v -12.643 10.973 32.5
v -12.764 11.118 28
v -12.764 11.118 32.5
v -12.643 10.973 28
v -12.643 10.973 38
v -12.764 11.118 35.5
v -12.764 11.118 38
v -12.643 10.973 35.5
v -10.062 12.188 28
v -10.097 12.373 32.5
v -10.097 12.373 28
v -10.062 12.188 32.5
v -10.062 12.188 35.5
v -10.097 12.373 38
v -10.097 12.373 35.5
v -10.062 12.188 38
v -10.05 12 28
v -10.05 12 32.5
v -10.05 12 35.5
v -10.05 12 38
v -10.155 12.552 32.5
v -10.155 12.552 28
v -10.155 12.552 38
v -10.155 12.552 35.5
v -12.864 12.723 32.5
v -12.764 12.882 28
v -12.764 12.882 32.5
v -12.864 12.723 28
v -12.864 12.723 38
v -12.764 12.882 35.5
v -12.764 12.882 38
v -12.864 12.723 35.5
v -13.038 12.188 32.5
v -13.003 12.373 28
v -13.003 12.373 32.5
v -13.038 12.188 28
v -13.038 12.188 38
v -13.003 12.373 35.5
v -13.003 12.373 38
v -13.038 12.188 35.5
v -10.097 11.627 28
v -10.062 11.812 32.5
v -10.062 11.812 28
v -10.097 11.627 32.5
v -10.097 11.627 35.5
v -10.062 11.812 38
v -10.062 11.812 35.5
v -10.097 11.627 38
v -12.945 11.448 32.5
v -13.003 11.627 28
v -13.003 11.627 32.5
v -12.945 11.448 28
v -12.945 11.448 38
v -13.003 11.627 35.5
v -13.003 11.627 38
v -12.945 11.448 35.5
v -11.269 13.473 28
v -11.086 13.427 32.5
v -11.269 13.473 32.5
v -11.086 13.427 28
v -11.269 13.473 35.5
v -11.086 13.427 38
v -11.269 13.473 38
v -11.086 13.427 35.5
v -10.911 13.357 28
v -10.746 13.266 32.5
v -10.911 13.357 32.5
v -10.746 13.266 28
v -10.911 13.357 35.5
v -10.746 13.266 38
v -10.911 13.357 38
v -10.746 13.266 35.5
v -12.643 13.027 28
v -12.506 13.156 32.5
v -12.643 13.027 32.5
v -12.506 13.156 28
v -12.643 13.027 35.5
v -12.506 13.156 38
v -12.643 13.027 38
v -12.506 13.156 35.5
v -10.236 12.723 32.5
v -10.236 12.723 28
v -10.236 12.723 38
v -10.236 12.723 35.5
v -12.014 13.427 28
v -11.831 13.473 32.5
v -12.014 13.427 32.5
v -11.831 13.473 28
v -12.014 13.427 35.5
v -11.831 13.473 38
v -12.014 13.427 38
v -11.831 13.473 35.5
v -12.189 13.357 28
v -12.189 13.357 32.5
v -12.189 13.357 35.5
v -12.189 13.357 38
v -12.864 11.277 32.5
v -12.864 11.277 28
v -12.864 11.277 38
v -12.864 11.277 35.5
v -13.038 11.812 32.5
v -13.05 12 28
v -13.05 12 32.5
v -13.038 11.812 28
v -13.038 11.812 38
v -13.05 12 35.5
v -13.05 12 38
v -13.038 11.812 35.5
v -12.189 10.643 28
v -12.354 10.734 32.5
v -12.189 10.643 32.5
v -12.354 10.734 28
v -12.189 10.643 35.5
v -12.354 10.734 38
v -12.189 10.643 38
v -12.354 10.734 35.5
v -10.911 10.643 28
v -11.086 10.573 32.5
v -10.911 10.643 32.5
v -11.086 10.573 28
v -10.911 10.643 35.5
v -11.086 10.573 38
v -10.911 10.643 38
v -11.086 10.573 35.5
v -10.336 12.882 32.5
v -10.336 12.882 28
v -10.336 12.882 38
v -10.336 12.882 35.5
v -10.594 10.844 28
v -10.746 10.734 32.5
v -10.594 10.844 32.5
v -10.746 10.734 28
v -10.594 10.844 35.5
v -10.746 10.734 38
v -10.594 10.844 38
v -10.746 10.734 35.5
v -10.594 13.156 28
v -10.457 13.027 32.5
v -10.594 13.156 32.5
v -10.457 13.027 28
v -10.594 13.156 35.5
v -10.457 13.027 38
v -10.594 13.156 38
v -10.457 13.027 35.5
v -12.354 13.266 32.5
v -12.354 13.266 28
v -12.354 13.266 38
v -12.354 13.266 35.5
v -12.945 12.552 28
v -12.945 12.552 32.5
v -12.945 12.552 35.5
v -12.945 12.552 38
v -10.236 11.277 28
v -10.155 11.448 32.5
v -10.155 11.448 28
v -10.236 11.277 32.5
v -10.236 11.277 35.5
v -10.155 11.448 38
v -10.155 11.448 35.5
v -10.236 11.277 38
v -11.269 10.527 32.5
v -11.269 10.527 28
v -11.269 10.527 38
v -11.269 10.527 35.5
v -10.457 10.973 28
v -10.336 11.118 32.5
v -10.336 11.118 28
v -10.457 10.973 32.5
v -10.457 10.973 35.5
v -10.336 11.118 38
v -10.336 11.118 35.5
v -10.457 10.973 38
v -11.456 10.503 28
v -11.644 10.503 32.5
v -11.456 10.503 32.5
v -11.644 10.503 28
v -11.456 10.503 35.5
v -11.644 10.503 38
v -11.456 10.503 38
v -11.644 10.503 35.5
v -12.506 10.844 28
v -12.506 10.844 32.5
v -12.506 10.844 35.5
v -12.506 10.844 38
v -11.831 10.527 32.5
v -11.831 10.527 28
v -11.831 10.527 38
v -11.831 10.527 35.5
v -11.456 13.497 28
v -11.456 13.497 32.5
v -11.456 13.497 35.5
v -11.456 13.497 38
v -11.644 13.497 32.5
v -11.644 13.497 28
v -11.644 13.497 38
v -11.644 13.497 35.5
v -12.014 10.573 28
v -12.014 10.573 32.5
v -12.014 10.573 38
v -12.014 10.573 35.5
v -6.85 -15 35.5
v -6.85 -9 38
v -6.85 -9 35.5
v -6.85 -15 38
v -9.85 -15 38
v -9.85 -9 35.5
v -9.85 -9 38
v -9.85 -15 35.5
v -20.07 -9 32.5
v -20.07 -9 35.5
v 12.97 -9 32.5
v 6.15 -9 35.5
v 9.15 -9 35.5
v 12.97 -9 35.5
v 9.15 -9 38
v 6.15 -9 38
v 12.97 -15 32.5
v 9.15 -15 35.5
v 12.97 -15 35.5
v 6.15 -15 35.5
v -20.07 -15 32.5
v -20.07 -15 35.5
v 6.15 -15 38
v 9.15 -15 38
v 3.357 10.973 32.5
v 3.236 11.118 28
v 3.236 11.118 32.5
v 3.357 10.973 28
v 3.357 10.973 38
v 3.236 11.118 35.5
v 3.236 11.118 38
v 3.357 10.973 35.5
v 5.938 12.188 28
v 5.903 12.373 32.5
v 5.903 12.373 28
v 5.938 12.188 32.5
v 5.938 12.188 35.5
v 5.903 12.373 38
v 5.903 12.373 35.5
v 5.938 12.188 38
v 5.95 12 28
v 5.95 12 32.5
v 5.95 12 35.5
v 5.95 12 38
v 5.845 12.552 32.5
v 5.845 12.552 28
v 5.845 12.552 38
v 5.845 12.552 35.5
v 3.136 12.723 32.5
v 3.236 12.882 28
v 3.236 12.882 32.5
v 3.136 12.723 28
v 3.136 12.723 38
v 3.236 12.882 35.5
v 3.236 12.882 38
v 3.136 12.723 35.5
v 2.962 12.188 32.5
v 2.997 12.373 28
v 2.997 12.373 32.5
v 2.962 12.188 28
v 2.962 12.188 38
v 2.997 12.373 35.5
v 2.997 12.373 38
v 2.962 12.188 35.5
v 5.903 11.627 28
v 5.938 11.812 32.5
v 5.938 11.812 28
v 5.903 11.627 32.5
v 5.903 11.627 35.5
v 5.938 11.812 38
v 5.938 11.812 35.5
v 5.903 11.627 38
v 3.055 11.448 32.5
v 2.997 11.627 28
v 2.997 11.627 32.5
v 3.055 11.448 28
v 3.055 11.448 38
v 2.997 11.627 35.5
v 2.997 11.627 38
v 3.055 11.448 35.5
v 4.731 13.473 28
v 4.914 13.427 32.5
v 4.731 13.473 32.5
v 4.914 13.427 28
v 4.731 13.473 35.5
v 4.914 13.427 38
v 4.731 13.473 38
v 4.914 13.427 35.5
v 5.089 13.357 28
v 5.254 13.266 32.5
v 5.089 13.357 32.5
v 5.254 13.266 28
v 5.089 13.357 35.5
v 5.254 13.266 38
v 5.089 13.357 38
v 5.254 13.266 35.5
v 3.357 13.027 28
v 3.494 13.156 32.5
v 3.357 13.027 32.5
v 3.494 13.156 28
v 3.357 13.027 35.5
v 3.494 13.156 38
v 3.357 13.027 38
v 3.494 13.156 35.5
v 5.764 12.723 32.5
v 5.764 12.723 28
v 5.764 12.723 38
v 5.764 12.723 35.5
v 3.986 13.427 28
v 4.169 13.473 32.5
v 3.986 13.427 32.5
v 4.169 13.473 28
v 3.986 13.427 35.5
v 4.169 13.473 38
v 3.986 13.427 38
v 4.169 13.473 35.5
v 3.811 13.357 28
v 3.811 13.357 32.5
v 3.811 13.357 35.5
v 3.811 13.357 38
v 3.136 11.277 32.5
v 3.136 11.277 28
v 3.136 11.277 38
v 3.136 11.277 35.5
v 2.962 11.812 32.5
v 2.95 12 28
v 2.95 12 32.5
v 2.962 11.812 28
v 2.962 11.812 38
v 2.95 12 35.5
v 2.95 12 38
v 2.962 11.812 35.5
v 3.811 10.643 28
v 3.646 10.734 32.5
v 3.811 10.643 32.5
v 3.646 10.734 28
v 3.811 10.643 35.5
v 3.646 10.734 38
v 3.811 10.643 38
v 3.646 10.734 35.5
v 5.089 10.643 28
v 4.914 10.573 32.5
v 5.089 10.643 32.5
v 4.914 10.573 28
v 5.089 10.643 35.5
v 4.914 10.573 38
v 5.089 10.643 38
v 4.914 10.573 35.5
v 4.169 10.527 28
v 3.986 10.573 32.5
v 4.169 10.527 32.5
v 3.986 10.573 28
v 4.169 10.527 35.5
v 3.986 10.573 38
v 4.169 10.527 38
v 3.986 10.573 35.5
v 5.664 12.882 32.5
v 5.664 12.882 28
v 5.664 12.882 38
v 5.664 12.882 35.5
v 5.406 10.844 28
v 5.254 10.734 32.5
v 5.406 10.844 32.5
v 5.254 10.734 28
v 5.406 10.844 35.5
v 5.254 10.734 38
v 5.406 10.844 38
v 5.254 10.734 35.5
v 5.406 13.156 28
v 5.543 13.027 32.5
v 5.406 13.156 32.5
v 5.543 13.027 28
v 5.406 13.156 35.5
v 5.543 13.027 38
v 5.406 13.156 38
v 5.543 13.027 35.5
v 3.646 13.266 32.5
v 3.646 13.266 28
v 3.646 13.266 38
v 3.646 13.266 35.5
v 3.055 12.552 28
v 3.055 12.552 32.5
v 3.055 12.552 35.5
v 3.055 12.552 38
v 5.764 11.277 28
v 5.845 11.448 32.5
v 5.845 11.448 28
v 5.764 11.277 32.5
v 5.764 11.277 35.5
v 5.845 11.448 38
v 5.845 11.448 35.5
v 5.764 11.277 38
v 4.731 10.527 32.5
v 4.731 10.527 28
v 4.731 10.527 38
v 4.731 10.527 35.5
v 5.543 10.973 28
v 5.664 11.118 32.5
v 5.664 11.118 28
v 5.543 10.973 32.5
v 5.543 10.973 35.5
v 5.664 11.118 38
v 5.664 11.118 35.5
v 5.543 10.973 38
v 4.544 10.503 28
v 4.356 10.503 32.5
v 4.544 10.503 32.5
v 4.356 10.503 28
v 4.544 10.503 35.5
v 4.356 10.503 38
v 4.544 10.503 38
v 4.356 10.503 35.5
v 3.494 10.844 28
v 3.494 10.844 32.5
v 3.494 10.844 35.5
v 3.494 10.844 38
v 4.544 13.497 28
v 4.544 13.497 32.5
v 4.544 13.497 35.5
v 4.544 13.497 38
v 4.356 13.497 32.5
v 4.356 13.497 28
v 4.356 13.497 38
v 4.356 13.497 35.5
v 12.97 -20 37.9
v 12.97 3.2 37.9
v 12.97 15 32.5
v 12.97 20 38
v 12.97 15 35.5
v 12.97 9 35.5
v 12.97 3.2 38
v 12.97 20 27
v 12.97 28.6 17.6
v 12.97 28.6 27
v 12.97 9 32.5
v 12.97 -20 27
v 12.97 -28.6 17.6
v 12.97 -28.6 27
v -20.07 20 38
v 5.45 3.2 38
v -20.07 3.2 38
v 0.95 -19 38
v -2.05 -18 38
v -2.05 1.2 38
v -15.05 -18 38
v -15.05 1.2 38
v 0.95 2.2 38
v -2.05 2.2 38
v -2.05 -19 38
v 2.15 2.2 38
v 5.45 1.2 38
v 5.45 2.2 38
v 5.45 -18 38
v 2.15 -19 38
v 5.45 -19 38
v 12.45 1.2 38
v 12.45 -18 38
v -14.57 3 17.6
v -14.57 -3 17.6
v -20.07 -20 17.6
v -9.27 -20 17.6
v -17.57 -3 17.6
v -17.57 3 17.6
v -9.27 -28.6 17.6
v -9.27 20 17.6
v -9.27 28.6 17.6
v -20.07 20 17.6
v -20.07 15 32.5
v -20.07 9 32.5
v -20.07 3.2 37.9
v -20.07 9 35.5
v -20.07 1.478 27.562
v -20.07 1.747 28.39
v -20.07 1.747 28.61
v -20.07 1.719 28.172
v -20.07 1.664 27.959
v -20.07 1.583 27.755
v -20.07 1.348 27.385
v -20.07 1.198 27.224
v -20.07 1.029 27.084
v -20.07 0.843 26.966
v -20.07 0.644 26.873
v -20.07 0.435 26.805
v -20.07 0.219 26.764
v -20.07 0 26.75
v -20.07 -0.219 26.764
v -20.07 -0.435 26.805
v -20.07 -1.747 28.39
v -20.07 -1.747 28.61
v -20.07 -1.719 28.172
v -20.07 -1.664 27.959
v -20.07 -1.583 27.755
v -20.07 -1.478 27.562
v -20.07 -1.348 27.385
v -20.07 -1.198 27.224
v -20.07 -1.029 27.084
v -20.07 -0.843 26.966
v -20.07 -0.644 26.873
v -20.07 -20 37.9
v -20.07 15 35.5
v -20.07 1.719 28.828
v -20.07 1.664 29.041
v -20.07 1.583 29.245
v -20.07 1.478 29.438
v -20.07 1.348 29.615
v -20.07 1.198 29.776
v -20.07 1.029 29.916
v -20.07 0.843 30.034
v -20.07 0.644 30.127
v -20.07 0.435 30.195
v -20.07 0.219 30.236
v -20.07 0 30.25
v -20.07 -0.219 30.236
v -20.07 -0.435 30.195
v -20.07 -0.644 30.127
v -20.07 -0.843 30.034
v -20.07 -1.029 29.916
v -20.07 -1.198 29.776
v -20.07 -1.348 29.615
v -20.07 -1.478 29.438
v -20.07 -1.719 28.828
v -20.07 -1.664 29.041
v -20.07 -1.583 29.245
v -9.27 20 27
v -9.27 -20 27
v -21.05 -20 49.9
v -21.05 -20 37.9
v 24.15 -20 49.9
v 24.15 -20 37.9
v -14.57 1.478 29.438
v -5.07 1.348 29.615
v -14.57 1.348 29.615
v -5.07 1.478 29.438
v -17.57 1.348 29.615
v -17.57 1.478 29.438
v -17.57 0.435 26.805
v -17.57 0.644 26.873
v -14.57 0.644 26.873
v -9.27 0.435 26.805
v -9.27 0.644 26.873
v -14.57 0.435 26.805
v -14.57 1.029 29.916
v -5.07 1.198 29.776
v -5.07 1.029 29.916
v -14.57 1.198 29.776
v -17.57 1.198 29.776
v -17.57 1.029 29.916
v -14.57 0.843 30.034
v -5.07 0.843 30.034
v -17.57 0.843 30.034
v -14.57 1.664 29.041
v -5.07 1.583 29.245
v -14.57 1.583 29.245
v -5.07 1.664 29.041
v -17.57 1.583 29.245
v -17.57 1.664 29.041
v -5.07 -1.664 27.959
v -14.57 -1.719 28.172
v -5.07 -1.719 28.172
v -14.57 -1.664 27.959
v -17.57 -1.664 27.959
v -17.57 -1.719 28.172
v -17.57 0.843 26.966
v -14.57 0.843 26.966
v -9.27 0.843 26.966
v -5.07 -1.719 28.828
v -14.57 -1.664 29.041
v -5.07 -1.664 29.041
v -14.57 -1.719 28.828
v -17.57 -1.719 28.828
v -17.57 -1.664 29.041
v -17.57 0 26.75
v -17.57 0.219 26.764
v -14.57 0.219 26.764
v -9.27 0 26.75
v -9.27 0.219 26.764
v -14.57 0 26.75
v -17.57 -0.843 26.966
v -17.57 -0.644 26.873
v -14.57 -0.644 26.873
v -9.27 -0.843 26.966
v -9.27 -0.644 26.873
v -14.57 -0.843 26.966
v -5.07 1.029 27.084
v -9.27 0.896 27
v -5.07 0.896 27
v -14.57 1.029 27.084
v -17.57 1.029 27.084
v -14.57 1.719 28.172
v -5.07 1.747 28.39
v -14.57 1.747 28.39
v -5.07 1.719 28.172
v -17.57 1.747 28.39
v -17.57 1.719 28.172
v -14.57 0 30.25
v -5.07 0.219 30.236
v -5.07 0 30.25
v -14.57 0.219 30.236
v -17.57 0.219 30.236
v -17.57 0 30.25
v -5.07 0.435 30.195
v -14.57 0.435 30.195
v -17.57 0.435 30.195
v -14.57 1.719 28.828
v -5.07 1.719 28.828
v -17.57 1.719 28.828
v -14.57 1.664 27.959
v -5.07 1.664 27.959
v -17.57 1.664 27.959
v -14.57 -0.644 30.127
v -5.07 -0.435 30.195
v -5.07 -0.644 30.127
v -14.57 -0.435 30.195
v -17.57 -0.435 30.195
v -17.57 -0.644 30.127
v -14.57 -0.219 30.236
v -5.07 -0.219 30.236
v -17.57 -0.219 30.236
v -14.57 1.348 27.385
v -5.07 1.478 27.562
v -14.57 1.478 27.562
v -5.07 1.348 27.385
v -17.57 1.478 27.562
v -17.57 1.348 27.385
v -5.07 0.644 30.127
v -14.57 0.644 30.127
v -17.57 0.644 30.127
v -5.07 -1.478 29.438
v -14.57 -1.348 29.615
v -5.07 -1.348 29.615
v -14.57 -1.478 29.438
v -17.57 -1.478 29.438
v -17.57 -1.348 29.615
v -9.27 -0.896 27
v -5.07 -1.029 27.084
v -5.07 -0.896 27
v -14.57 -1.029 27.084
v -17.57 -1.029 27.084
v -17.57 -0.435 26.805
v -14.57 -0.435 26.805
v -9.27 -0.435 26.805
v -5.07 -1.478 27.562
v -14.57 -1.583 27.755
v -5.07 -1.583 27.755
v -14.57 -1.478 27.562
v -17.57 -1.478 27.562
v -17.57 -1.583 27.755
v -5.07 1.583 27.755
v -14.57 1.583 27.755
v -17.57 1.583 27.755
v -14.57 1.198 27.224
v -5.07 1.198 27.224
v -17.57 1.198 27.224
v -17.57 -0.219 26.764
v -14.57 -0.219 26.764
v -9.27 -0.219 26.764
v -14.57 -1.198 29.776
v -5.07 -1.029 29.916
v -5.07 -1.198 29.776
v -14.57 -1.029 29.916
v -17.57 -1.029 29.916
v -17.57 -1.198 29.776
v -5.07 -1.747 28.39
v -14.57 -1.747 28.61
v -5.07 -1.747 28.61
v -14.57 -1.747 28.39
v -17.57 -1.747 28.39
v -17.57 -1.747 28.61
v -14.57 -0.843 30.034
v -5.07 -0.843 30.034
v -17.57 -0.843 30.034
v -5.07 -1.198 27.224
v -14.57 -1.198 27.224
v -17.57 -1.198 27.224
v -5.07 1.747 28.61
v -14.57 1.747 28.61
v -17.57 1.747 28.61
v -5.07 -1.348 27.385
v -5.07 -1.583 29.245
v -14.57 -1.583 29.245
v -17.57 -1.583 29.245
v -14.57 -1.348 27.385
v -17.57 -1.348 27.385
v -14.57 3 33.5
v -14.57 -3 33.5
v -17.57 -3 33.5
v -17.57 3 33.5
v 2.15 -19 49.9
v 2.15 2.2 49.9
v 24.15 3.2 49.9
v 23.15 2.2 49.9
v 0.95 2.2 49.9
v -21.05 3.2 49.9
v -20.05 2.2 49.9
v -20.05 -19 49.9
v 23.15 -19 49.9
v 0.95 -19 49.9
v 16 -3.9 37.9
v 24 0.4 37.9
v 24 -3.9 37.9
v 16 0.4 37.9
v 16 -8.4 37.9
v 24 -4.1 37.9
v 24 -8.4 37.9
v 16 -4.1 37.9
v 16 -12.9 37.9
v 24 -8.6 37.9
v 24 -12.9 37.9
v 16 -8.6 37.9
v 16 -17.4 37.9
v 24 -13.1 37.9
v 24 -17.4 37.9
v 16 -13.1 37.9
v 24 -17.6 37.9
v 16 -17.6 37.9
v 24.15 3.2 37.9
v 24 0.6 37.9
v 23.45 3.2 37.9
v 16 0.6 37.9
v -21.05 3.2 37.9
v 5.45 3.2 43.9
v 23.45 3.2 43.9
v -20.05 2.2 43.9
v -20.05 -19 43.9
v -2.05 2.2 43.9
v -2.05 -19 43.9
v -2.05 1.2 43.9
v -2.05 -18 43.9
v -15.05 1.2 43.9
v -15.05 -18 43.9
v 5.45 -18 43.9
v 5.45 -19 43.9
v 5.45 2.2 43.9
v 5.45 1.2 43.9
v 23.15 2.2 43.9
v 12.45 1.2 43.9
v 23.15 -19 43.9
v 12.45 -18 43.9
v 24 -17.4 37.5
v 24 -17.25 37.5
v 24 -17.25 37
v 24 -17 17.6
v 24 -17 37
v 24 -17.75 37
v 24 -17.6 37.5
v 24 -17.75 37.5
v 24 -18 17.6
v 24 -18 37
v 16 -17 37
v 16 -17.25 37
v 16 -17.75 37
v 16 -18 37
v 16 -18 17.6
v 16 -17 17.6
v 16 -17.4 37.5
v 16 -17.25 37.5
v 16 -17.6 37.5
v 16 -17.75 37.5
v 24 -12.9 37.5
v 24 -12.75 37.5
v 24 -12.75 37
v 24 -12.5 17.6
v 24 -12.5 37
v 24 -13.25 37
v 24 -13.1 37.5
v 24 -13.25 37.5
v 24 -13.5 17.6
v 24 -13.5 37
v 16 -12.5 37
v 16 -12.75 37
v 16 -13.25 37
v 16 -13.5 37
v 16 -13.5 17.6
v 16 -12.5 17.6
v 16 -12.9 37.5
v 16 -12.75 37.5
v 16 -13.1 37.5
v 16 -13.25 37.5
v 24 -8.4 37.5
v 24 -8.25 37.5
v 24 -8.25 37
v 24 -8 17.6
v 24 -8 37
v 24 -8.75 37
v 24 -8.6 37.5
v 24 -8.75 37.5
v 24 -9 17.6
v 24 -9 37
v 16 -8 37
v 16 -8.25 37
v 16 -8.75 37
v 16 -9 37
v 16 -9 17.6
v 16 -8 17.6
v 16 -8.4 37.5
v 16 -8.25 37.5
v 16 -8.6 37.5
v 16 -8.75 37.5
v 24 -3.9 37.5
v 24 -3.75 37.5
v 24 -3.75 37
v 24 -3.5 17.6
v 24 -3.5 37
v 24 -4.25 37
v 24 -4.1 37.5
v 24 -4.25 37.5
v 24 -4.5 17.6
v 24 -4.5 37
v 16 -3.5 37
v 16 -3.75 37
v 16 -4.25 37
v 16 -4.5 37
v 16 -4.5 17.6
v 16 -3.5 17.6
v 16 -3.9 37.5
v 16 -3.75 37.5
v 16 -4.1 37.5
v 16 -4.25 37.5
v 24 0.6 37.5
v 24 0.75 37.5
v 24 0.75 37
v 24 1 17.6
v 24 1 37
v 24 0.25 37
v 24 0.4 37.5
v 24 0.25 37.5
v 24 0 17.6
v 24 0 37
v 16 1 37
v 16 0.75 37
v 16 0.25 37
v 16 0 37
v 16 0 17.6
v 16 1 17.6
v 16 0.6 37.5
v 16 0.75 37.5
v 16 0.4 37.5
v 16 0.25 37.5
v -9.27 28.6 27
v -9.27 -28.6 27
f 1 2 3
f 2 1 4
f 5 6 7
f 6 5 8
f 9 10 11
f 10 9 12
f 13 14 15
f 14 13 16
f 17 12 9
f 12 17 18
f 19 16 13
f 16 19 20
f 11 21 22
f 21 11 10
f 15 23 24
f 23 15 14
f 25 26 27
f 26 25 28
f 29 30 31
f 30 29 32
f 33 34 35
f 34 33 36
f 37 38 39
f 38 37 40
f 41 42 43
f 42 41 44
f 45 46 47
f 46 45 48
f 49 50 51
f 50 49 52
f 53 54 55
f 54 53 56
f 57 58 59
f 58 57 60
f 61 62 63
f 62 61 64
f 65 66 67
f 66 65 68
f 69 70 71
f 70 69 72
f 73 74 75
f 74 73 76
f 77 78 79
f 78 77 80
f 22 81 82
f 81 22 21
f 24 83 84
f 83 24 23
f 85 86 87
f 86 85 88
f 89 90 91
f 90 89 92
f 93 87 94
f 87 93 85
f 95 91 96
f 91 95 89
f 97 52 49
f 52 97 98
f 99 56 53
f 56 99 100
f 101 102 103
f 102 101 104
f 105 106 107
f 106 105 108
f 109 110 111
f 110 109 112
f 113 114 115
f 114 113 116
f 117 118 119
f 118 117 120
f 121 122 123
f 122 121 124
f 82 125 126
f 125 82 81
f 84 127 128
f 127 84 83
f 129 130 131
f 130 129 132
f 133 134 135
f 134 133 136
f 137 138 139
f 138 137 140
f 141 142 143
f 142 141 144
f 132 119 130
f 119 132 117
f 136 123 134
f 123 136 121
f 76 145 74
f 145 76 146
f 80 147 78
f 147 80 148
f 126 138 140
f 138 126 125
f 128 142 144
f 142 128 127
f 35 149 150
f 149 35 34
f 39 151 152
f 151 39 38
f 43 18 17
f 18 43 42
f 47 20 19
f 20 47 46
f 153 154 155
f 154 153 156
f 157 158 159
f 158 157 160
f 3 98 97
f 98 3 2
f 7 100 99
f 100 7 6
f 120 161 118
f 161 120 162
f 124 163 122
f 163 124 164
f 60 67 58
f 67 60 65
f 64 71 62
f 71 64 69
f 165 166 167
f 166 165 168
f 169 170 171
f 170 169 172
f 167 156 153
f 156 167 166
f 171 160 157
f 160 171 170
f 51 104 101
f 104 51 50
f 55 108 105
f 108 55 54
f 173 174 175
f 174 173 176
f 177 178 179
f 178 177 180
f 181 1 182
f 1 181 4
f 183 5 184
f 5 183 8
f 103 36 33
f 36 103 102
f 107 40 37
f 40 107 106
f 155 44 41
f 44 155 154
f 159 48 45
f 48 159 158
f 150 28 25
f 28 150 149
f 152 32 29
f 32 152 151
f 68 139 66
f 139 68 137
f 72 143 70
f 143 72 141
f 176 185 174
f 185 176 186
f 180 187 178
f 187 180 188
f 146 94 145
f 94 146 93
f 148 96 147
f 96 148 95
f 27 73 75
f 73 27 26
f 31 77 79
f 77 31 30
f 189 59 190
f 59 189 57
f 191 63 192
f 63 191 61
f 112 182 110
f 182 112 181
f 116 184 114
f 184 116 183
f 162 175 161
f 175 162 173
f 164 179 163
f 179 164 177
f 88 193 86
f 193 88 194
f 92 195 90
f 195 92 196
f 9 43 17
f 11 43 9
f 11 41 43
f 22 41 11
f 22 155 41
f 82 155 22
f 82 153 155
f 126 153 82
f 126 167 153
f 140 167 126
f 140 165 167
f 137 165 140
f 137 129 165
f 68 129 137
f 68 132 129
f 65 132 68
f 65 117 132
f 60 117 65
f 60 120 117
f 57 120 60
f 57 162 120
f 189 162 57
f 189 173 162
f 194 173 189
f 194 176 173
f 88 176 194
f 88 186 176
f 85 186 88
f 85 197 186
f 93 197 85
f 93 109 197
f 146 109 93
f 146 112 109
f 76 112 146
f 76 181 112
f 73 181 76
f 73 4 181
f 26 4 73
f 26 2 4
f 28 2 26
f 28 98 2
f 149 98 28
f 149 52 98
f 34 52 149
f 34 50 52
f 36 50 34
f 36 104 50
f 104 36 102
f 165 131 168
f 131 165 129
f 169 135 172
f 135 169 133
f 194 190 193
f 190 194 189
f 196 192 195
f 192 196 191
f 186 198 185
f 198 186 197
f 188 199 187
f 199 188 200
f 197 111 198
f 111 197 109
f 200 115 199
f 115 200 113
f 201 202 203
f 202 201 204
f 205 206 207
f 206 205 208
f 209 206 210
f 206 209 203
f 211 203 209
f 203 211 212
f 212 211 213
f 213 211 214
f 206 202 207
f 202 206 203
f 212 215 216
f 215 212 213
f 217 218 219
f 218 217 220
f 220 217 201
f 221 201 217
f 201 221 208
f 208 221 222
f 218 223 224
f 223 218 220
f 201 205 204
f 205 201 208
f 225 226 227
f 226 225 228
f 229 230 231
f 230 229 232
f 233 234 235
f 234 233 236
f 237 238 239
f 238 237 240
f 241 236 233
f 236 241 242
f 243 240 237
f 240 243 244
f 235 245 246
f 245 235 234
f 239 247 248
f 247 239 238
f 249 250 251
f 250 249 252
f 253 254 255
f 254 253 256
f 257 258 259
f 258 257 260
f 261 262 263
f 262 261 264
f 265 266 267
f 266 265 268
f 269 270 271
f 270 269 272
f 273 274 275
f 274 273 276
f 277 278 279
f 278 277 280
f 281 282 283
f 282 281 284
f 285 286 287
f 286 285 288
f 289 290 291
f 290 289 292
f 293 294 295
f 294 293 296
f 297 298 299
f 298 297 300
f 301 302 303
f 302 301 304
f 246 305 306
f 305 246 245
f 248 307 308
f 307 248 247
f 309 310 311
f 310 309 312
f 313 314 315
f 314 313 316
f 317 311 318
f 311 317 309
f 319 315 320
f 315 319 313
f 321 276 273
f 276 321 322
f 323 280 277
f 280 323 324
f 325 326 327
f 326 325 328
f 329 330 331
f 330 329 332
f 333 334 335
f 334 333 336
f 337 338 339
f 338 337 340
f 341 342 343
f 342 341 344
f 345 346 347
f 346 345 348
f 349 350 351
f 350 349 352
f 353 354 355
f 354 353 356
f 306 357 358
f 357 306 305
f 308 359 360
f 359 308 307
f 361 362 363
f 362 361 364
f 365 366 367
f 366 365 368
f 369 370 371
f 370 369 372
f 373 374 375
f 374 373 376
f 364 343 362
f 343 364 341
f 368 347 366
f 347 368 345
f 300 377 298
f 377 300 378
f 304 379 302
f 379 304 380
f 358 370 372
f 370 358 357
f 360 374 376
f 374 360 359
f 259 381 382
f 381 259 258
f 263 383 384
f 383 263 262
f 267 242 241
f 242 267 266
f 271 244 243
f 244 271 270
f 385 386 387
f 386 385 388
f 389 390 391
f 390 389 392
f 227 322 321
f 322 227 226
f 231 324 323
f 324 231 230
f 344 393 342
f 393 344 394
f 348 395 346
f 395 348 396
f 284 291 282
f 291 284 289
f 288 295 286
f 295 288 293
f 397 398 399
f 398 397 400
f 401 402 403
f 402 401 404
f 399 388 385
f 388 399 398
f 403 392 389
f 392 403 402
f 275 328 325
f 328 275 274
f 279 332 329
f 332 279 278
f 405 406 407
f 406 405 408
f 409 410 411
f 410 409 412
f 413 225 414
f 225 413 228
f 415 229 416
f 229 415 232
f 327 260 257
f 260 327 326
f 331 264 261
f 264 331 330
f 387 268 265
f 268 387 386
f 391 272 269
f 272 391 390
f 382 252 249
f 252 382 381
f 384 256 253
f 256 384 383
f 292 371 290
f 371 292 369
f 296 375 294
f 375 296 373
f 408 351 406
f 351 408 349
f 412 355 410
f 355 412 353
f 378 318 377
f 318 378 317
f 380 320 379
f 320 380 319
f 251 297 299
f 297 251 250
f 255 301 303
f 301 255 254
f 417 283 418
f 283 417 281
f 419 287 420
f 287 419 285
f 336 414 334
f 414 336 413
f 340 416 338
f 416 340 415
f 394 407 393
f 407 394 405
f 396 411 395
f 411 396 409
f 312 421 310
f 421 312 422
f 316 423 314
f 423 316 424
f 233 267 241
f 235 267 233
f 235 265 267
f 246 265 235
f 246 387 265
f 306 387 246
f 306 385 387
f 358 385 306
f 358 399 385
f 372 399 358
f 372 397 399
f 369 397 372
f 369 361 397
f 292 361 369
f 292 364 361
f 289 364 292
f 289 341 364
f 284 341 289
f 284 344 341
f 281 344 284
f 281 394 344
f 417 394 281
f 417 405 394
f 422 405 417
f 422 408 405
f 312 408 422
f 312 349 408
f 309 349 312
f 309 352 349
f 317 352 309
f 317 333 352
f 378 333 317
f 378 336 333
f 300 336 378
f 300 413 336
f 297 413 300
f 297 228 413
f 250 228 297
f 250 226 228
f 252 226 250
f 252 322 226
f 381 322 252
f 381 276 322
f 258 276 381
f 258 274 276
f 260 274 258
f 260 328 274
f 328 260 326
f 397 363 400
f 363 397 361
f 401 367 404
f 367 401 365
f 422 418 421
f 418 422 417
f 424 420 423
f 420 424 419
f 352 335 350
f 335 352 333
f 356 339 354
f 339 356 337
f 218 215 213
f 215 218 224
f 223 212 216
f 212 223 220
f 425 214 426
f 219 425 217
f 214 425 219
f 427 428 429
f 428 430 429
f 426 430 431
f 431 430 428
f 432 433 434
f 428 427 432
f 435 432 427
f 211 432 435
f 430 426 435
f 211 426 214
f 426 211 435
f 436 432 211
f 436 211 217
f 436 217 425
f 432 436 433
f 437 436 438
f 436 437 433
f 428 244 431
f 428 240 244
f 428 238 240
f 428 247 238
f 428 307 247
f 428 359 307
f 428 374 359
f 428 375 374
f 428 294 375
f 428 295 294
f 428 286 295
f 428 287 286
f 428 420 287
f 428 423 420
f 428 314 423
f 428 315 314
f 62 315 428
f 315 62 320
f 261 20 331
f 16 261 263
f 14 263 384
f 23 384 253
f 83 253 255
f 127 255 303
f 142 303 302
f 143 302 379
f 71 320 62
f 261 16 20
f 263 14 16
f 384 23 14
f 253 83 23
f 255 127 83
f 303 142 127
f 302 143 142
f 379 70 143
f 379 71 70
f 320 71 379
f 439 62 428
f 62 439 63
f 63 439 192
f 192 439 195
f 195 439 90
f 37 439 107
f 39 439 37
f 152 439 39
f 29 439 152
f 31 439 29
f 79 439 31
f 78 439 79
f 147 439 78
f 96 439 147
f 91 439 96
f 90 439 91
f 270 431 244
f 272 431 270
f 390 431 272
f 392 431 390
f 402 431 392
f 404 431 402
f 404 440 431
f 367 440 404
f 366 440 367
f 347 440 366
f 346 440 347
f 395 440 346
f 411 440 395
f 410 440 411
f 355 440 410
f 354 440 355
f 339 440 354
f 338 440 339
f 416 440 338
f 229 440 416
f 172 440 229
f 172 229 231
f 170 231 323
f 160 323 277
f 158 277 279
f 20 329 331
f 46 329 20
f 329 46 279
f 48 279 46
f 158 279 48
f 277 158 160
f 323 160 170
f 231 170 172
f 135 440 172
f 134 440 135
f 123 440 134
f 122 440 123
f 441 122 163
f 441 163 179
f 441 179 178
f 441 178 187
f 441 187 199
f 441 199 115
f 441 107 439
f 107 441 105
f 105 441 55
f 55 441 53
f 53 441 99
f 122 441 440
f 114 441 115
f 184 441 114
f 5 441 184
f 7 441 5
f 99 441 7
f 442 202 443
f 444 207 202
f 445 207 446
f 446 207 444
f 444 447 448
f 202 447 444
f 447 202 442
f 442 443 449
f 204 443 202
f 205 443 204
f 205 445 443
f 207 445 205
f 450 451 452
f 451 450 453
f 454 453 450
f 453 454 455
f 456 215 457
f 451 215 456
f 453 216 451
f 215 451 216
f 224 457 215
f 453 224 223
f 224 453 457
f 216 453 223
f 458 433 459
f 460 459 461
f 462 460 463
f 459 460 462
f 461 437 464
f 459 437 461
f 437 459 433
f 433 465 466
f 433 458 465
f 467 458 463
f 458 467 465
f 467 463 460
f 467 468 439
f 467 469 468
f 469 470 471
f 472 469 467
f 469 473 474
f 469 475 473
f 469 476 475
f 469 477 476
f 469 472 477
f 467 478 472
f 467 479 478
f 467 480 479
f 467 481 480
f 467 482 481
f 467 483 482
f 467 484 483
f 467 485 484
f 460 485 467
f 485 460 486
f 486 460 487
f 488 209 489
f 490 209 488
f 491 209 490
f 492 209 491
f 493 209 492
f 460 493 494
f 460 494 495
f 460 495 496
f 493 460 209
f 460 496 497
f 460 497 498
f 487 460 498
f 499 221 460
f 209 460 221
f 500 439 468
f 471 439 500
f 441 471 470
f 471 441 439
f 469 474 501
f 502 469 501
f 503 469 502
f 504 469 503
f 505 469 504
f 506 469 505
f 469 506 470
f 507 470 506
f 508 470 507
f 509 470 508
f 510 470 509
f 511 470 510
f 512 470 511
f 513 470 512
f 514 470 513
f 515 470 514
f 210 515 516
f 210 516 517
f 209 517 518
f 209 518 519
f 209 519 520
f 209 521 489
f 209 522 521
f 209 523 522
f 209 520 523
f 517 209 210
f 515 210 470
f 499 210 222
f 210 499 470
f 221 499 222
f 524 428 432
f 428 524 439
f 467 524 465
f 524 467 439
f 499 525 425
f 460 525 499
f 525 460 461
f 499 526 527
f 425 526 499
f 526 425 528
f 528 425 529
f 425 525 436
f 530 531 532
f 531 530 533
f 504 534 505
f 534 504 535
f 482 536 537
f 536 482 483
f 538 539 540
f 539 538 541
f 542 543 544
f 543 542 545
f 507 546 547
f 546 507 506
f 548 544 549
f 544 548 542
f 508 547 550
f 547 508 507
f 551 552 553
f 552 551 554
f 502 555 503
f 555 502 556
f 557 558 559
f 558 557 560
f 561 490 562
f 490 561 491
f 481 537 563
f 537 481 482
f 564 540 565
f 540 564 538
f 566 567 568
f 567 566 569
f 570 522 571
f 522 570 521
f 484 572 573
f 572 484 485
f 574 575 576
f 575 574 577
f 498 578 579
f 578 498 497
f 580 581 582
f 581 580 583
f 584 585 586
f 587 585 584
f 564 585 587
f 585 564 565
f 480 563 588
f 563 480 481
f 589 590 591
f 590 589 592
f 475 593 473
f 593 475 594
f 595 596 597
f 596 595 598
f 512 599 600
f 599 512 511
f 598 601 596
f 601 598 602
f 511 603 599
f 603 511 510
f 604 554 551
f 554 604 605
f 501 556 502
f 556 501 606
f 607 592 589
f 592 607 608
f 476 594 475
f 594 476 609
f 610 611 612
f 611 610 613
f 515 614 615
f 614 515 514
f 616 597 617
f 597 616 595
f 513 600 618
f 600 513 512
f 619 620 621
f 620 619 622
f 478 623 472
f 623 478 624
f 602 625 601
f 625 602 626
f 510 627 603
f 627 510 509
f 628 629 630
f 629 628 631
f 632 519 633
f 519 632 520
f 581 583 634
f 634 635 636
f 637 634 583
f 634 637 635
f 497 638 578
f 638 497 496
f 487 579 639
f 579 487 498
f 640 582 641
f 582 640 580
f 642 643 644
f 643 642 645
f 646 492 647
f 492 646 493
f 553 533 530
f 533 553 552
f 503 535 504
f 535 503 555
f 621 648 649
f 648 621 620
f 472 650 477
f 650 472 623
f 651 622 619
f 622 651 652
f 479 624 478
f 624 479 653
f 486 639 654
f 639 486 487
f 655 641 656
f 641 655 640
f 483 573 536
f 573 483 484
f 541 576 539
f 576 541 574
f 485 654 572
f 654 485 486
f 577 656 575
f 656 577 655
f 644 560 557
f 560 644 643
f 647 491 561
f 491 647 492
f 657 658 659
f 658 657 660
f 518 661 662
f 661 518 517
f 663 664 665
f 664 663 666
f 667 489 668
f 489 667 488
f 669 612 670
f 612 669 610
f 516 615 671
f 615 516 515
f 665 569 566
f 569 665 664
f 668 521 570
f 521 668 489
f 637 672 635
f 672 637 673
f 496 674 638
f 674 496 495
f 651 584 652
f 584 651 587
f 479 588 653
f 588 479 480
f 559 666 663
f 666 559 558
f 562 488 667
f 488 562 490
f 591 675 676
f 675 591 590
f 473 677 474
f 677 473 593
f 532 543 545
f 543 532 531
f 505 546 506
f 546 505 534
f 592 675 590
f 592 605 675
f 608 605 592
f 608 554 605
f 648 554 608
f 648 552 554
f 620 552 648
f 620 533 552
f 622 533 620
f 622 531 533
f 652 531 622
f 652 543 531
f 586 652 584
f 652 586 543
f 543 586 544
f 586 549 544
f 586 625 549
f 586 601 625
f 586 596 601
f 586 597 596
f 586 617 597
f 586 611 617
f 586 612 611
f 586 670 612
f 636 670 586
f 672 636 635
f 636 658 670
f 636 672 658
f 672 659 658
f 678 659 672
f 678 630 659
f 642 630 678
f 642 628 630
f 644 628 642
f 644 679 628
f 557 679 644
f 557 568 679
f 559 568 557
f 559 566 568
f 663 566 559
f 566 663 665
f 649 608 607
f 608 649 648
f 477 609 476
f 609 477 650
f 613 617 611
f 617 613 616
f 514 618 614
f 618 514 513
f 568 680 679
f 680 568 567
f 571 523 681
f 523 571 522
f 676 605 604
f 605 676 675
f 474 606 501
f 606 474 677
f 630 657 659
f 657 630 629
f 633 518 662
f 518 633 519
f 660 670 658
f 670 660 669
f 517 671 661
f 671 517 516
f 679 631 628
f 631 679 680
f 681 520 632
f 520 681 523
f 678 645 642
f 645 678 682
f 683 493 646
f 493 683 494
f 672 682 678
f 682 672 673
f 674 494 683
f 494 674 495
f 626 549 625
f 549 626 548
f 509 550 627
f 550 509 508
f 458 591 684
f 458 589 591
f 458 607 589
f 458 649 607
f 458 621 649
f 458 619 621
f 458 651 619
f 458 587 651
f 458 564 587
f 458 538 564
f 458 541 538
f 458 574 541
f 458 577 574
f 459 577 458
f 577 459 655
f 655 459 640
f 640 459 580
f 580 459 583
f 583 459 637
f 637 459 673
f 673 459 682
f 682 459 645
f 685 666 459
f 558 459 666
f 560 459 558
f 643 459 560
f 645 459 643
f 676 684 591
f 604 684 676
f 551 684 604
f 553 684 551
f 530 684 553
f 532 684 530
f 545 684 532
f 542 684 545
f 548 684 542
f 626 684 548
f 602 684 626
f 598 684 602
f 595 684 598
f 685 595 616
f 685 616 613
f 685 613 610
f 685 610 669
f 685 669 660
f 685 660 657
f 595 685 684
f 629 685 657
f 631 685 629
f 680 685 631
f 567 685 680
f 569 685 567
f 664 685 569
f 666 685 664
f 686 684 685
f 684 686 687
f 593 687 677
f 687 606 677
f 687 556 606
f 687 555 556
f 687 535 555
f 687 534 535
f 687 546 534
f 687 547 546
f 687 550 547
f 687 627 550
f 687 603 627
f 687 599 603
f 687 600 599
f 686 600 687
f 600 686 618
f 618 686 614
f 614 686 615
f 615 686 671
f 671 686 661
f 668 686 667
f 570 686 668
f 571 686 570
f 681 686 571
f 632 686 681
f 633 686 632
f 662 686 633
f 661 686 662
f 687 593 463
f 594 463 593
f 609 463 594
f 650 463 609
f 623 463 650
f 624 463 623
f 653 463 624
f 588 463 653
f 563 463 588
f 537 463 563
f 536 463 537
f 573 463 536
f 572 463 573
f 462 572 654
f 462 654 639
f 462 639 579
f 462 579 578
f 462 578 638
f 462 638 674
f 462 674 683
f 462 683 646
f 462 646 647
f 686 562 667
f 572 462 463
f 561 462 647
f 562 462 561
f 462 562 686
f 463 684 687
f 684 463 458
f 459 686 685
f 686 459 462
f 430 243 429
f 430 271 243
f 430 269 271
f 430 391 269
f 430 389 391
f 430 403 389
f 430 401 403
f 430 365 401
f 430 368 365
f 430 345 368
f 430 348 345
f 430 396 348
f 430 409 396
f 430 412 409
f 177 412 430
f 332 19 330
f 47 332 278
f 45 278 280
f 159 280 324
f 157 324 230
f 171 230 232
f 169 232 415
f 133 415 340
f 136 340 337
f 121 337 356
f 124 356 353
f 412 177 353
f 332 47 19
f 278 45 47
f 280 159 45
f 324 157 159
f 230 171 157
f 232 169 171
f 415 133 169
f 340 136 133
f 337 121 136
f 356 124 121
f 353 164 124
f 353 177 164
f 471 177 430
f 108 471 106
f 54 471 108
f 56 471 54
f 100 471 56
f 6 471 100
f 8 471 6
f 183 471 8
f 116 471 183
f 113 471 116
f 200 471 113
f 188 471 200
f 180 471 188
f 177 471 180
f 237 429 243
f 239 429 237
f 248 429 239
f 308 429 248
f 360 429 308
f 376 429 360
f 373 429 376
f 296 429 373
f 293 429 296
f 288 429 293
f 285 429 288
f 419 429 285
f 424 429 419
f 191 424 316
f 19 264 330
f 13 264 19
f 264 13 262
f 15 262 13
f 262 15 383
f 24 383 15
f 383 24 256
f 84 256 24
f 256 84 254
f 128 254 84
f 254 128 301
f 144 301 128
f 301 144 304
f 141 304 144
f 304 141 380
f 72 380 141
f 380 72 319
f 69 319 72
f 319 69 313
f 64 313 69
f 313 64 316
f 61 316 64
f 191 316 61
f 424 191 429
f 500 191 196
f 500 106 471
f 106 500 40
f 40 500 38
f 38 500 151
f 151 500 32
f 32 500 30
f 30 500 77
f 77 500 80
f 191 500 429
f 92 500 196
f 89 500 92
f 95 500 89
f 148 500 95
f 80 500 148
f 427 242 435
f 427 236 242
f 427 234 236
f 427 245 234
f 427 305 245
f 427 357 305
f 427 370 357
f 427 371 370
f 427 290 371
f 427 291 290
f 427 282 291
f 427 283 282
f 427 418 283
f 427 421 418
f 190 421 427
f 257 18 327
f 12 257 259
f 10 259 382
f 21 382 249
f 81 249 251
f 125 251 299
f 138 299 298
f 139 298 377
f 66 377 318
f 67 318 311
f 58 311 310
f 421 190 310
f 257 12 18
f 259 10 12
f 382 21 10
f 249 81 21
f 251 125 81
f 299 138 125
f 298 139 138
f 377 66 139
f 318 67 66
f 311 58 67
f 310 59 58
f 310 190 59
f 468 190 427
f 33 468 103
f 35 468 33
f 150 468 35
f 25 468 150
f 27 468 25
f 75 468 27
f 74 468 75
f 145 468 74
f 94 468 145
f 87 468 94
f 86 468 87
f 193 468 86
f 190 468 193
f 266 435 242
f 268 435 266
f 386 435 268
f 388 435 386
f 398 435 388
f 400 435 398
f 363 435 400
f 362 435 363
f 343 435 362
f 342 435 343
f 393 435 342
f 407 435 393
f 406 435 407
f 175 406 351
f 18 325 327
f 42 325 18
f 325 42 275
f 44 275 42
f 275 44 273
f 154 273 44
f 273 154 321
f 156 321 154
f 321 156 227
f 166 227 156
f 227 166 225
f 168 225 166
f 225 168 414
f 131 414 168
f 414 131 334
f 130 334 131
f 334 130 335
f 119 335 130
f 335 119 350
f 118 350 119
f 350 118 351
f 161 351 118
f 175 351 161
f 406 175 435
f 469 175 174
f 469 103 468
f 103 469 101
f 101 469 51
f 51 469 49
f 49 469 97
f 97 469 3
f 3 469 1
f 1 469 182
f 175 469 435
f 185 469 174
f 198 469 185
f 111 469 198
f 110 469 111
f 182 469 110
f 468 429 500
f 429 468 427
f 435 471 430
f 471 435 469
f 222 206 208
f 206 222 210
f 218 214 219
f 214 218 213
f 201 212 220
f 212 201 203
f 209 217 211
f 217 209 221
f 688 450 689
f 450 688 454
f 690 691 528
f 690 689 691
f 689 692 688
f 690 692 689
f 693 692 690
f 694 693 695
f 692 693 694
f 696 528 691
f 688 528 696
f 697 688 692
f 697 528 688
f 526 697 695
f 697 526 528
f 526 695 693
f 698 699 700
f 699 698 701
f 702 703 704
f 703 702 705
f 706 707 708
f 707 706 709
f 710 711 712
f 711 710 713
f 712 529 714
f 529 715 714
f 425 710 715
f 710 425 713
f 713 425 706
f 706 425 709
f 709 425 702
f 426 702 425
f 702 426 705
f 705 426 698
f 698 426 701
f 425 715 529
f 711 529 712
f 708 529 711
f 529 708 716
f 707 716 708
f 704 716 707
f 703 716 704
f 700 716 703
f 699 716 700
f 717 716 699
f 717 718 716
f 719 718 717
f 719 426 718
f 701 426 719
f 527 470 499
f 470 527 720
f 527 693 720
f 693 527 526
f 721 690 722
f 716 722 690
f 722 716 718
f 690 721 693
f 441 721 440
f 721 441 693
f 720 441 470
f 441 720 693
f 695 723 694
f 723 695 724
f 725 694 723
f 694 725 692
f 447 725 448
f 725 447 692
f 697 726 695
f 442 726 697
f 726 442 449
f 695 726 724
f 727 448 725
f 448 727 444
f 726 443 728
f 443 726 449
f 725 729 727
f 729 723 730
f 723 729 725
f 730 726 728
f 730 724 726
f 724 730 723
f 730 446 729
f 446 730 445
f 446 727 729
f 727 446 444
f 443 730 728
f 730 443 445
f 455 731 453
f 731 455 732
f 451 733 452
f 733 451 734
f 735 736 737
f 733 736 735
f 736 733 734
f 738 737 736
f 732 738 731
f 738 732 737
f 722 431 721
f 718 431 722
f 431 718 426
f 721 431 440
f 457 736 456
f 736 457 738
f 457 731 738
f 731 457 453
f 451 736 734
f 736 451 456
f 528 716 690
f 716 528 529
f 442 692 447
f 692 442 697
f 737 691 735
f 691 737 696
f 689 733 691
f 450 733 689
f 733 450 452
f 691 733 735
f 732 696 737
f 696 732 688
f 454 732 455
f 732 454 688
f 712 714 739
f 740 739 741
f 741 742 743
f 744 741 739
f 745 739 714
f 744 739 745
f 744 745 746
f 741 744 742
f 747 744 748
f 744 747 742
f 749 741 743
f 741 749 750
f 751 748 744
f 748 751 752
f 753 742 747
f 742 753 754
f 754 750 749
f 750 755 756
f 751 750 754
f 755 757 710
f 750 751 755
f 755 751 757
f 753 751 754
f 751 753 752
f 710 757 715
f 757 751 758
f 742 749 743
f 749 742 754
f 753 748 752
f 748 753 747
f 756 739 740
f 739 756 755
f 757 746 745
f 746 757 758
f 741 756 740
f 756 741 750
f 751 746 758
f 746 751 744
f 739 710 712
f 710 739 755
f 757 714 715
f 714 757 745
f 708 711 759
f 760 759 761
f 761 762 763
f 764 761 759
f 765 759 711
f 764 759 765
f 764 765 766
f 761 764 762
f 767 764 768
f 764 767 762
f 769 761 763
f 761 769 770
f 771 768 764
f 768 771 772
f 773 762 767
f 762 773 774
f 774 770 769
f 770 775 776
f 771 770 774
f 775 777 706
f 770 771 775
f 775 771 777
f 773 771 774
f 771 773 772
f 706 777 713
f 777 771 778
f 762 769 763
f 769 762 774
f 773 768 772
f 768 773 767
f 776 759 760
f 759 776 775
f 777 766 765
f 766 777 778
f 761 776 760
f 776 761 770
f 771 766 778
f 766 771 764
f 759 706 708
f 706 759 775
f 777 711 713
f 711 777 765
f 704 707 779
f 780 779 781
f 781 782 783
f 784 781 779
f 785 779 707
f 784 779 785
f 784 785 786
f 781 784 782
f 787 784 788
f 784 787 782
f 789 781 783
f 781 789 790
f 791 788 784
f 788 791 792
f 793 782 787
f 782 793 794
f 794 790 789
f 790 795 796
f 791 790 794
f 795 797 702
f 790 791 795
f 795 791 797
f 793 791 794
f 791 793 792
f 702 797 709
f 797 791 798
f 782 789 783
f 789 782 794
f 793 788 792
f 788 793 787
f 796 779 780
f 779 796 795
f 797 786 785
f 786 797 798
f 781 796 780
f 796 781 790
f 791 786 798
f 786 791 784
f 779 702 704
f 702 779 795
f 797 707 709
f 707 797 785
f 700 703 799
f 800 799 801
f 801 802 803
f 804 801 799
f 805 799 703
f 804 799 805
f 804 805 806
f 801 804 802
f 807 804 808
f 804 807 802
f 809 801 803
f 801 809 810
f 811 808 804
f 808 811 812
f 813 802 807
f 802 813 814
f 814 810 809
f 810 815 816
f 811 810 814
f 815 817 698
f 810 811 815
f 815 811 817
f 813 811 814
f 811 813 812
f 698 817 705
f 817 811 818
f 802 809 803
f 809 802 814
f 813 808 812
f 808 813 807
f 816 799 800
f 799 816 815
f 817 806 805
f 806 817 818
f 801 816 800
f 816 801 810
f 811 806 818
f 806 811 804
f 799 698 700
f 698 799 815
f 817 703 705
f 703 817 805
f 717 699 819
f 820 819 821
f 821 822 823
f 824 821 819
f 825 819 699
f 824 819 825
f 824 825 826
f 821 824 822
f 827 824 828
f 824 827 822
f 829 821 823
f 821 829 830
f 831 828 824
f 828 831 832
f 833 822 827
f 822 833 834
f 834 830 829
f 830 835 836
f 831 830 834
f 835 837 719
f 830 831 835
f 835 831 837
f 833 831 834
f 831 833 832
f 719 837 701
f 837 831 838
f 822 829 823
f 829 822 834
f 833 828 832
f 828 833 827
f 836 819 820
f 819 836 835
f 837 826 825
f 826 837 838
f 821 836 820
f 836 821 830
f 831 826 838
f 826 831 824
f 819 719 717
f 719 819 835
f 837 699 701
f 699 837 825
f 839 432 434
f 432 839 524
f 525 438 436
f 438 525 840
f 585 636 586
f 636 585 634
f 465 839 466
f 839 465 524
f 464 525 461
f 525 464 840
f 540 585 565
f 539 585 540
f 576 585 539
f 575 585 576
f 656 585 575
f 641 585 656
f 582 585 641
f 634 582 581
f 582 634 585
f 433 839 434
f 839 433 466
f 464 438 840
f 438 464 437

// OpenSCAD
$fn = 50;

render_platform = false;
render_stage = true;
render_solenoid = false;
render_cartridge = false;

// all units in millimeters

solenoid_body_color = "Red";
// dimensions for solenoid at http://www.amazon.com/gp/product/B00DUYPQHU/ref=oh_aui_detailpage_o03_s00?ie=UTF8&psc=1
solenoid_body_height = 30;
solenoid_body_width = 25;
solenoid_body_length = 51;

solenoid_rod_color = "Black";
solenoid_stroke = 7.1;
solenoid_rod_min = 6;

platform_color = "LightBlue";
platform_height = 16;
platform_back_margin = 15;
platform_width = 80;
platform_length = 120;
platform_anchor_tolerance = 0.04;
platform_anchor_r = 3 + platform_anchor_tolerance; // half of d plus 0.04 tolerance
echo("platform_anchor_r = ", platform_anchor_r);
platform_anchor_rk = 9.78 / 2 + platform_anchor_tolerance; // half of dk plus 0.04 tolerance
echo("platform_anchor_rk = ", platform_anchor_rk);
platform_anchor_k = (5.7 + 0.3) * 2; // 0.3mm extra depth, and k is doubled for modeling
echo("platform_anchor_k = ", platform_anchor_k);
platform_anchor_spacing = 50;
platform_anchor_setback = -platform_anchor_spacing / 2;
platform_wiring_slot_length = 4;
platform_wiring_slot_width = 10;
platform_wiring_slot_margin = 4;

teflon_pad_thickness = 0.8;

stage_color = "LightGreen";
stage_elevation = 38;
stage_height = stage_elevation - platform_height - 2 * teflon_pad_thickness;
stage_bevel_radius = 2;
stage_width = 40;

platform_side_width = 10;
echo("platform_side_width = ", platform_side_width);
platform_side_length = platform_anchor_spacing - 2 * platform_anchor_rk;
echo("platform_side_length = ", platform_side_length);
platform_side_height = stage_elevation - platform_height;
echo("platform_side_height = ", platform_side_height);

stage_length = platform_side_length - solenoid_stroke;
echo("stage_length = ", stage_length);

platform_bumper_height = platform_side_height;
echo("platform_bumper_height = ", platform_bumper_height);
platform_bumper_length = 10;
echo("platform_bumper_length = ", platform_bumper_length);
platform_bumper_width = (platform_width - stage_width) / 2 - platform_side_width;
echo("platform_bumper_width = ", platform_bumper_width);

stage_rail_length = stage_length - platform_bumper_length - teflon_pad_thickness;
echo("stage_rail_length = ", stage_rail_length);
stage_rail_width = platform_width - 2 * platform_side_width - 3.5 * teflon_pad_thickness;
echo("stage_rail_width = ", stage_rail_width);
stage_rail_height = 0.5 * platform_side_height - 2 * teflon_pad_thickness;
echo("stage_rail_height = ", stage_rail_height);

platform_rail_width = platform_bumper_width - 2 * teflon_pad_thickness;
echo("platform_rail_width = ", platform_rail_width);
platform_rail_length = platform_side_length - platform_bumper_length;
echo("platform_rail_length = ", platform_rail_length);
platform_rail_height = 0.5 * platform_side_height - 2 * teflon_pad_thickness;
echo("platform_rail_height = ", platform_rail_height);

cartridge_well_width = 8;
cartridge_well_distance_from_centerline = 4;
cartridge_path_width = 1.5;
accessory_x_spacing = 16;
accessory_y_offset = 12;
accessory_x_offset = cartridge_well_width;
echo("accessory_x_offset = ", accessory_x_offset);

solenoid_margin = 0.5;
solenoid_podium_length = solenoid_body_length + 2 * solenoid_margin;
echo("solenoid_podium_length = ", solenoid_podium_length);
solenoid_podium_width = solenoid_body_width + 2 * solenoid_margin;
echo("solenoid_podium_width = ", solenoid_podium_width);

//stage_center_of_mass_y = 2 * teflon_pad_thickness + (stage_height * stage_width * stage_length * (stage_height / 2) + 2 * stage_rail_height * (stage_rail_width - stage_width) * stage_rail_length * (stage_rail_height / 2)) / (stage_height * stage_width * stage_length + stage_rail_height * 2 * (stage_rail_width - stage_width) * stage_rail_length);

stage_center_of_mass_y = 12.5;
echo("stage_center_of_mass_y = ", stage_center_of_mass_y);
solenoid_podium_height = stage_center_of_mass_y - solenoid_body_height / 2;
echo("solenoid_podium_height = ", solenoid_podium_height);
echo("solenoid_elevation = ", platform_height + solenoid_podium_height + solenoid_body_height);

support_height = stage_height;
support_z_offset = platform_height + 2 * teflon_pad_thickness;

if (render_platform) {
	// platform
	color(platform_color) {
		difference() {
			translate([-(platform_length / 2 - platform_anchor_spacing / 2 - platform_back_margin), 0, platform_height / 2])
				cube([platform_length, platform_width, platform_height], center = true);

	// anchor holes
			translate([platform_anchor_spacing + platform_anchor_setback, platform_anchor_spacing / 2, platform_height]) {
				cylinder(r = platform_anchor_r, h = 2 * platform_height, center = true);
				cylinder(r = platform_anchor_rk, h = platform_anchor_k, center = true);
			}
			translate([platform_anchor_setback, -platform_anchor_spacing / 2, platform_height]) {
				cylinder(r = platform_anchor_r, h = 2 * platform_height, center = true);
				cylinder(r = platform_anchor_rk, h = platform_anchor_k, center = true);
			}
			translate([platform_anchor_spacing + platform_anchor_setback, -platform_anchor_spacing / 2, platform_height]) {
				cylinder(r = platform_anchor_r, h = 2 * platform_height, center = true);
				cylinder(r = platform_anchor_rk, h = platform_anchor_k, center = true);
			}
			translate([platform_anchor_setback, platform_anchor_spacing / 2, platform_height]) {
				cylinder(r = platform_anchor_r, h = 2 * platform_height, center = true);
				cylinder(r = platform_anchor_rk, h = platform_anchor_k, center = true);
			}

	// wire terminal holes
			translate([-38, -26, platform_height]) {
				cylinder(r = 1.5, h = 40, center = true);
			}
			translate([-46, -26, platform_height]) {
				cylinder(r = 1.5, h = 40, center = true);
			}
			translate([-54, -26, platform_height]) {
				cylinder(r = 1.5, h = 40, center = true);
			}
			translate([-62, -26, platform_height]) {
				cylinder(r = 1.5, h = 40, center = true);
			}

	// solenoid holes
			translate([-platform_side_length / 2 - solenoid_rod_min - 7.5, solenoid_podium_width / 2 - 4, platform_height]) {
				cylinder(r = 2, h = 40, center = true);
			}
			translate([-platform_side_length / 2 - solenoid_rod_min - 7.5, -solenoid_podium_width / 2 + 4, platform_height]) {
				cylinder(r = 2, h = 40, center = true);
			}
			translate([-platform_side_length / 2 - solenoid_rod_min - 42.5, solenoid_podium_width / 2 - 4, platform_height]) {
				cylinder(r = 2, h = 40, center = true);
			}
			translate([-platform_side_length / 2 - solenoid_rod_min - 42.5, -solenoid_podium_width / 2 + 4, platform_height]) {
				cylinder(r = 2, h = 40, center = true);
			}

	// wiring access slots
			translate([-(platform_length - platform_back_margin - platform_anchor_spacing / 2 - platform_wiring_slot_length / 2) + platform_wiring_slot_margin, (platform_width - platform_wiring_slot_width) / 2 - platform_wiring_slot_margin, 0]) {
				cube([platform_wiring_slot_length, platform_wiring_slot_width, 2 * platform_height], center = true);
			}

			translate([-(platform_length - platform_back_margin - platform_anchor_spacing / 2 - platform_wiring_slot_length / 2) + platform_wiring_slot_margin, -(platform_width - platform_wiring_slot_width) / 2 + platform_wiring_slot_margin, 0]) {
				cube([platform_wiring_slot_length, platform_wiring_slot_width, 2 * platform_height], center = true);
			}

			translate([platform_back_margin + platform_anchor_spacing / 2 - platform_wiring_slot_length / 2 - platform_wiring_slot_margin, -12, 0]) {
				cube([platform_wiring_slot_length, platform_wiring_slot_width, 2 * platform_height], center = true);
			}

			if (solenoid_podium_height < 0) {
				translate([-(platform_side_length + solenoid_podium_length) / 2 - solenoid_rod_min + solenoid_margin, 0, platform_height + solenoid_podium_height / 2])
					cube([solenoid_podium_length, solenoid_podium_width, -2 * solenoid_podium_height], center = true);
			}
		}
	}
	
	// platform sides
	color(platform_color) {
		translate([0,  (platform_width - platform_side_width) / 2, platform_height + platform_side_height / 2])
			cube([platform_side_length, platform_side_width, platform_side_height], center = true);
	}
	
	color(platform_color) {
		translate([0, -(platform_width - platform_side_width) / 2, platform_height + platform_side_height / 2])
			cube([platform_side_length, platform_side_width, platform_side_height], center = true);
	}
	
	// platform rails
	color(platform_color) {
		translate([-(platform_side_length - platform_rail_length) / 2 + platform_bumper_length, ((platform_width - platform_rail_width) / 2 - platform_side_width), platform_height + platform_side_height - platform_rail_height / 2])
			cube([platform_rail_length, platform_rail_width, platform_rail_height], center = true);
	}
	
	color(platform_color) {
		translate([-(platform_side_length - platform_rail_length) / 2 + platform_bumper_length,  -((platform_width - platform_rail_width) / 2 - platform_side_width), platform_height + platform_side_height - platform_rail_height / 2])
			cube([platform_rail_length, platform_rail_width, platform_rail_height], center = true);
	}
	
	// platform stage bumper
	color(platform_color) {
		translate([-(platform_side_length - platform_bumper_length) / 2, platform_width / 2 - platform_side_width - platform_rail_width / 2, platform_height + platform_bumper_height / 2])
			cube([platform_bumper_length, platform_rail_width, platform_bumper_height], center = true);
	}
	
	color(platform_color) {
		translate([-(platform_side_length - platform_bumper_length) / 2, -(platform_width / 2 - platform_side_width - platform_rail_width / 2), platform_height + platform_bumper_height / 2])
			cube([platform_bumper_length, platform_rail_width, platform_bumper_height], center = true);
	}
	
	// solenoid podium
	if (solenoid_podium_height > 0) {
		color(platform_color) {
			translate([-(platform_side_length + solenoid_podium_length) / 2, 0, platform_height + solenoid_podium_height / 2])
				cube([solenoid_podium_length, solenoid_podium_width, solenoid_podium_height], center = true);
		}
	}

	// overhang supports
	for (x = [-15:5:15]) {
		translate([x + 2, (platform_width - platform_side_width) / 2 - 12, platform_height]) {
					translate([0.45, 0, 0]) cube([0.1, 5, 0.5]);
					translate([0.25, 0, 0.5]) cube([0.5, 5, 0.5]);
					translate([0, 0, 1]) cube([1, 5, platform_side_height - platform_rail_height - 2]);
					translate([0.25, 0, platform_side_height - platform_rail_height - 1]) cube([0.5, 5, 0.5]);
					translate([0.45, 0, platform_side_height - platform_rail_height - 0.5]) cube([0.1, 5, 0.5]);
				}
	}

	for (x = [-15:5:15]) {
		translate([x + 2, -(platform_width - platform_side_width) / 2 + 7, platform_height]) {
					translate([0.45, 0, 0]) cube([0.1, 5, 0.5]);
					translate([0.25, 0, 0.5]) cube([0.5, 5, 0.5]);
					translate([0, 0, 1]) cube([1, 5, platform_side_height - platform_rail_height - 2]);
					translate([0.25, 0, platform_side_height - platform_rail_height - 1]) cube([0.5, 5, 0.5]);
					translate([0.45, 0, platform_side_height - platform_rail_height - 0.5]) cube([0.1, 5, 0.5]);
				}
	}
}

stage_x_offset = (stage_length - platform_side_length) / 2;
echo("stage_x_offset = ", stage_x_offset);
if (render_stage) {
	// stage 
	color(stage_color) {
		difference() {
			translate([stage_x_offset, 0, stage_elevation - stage_height / 2])
				cube([stage_length, stage_width, stage_height], center = true);

	// solenoid rod hole
			translate([-platform_side_length / 2, 0, platform_height + solenoid_podium_height + solenoid_body_height / 2])
				rotate([0, 90, 0]) cylinder(r = 1.75, h = 30, center = true);

	// solenoid rod nut slot
			translate([4 - platform_side_length / 2, 0, platform_height + solenoid_podium_height + solenoid_body_height / 2 - 3])
				cube([3, 6, 16], center = true);

	// accessory hole slots
	
			translate([0, accessory_y_offset, stage_elevation - 4])
				cube([46, 6, 3], center = true);

			translate([0, -accessory_y_offset, stage_elevation - 4])
				cube([46, 6, 3], center = true);

	// accessory holes
			for (x = [-accessory_x_offset, accessory_x_spacing - accessory_x_offset]) {
			translate([stage_x_offset + x, accessory_y_offset, stage_elevation])
				cylinder(r = 1.5, h = 20, center = true);
	
			translate([stage_x_offset + x + 3.2, -accessory_y_offset, stage_elevation]) {
				cube([3, 6, 10], center = true);
			}
		}
	}
}
translate([2, 0, 0]) {
	for (x = [3 - accessory_x_offset, 25 - accessory_x_offset]) {
		translate([stage_x_offset + x - 14.5, -accessory_y_offset - 8, stage_elevation - 0.1])
				difference() {
					cube([23.2, 23.2, 12]);	
					translate([1, 1, 0]) cube([21.2, 21.2, 12]);	
				}
		translate([stage_x_offset - accessory_x_offset - 10.5, -accessory_y_offset - 8, stage_elevation - 0.1]) {
					difference() {
						cube([18, 23.2, 6]);
						translate([5, 2, 0]) cube([16, 19.2, 6]);
					}
				}
		translate([33 + stage_x_offset - accessory_x_offset, 15.2 - accessory_y_offset, stage_elevation - 0.1]) {
					rotate(180, 0, 0) difference() {
						cube([18, 23.2, 6]);
						translate([11, 2, 0]) cube([16, 19.2, 6]);
					}
				}
	}
}

	// stage rail
	
	color(stage_color) {
		translate([stage_x_offset + (stage_length - stage_rail_length) / 2, 0, platform_height + 2 * teflon_pad_thickness + stage_rail_height / 2])
			cube([stage_rail_length, stage_rail_width, stage_rail_height], center = true);
	}

//	for (y = [-20:4:4]) {
//		translate([-26, y, support_z_offset]) {
//					cube([5, 1, support_height - 1]);
//					translate([0, 0.25, support_height - 1]) cube([5, 0.5, 0.5]);
//					translate([0, 0.4, support_height - 0.5]) cube([5, 0.2, 0.5]);
//				}
//	}

	for (y = [-19:4.5:0]) {
		translate([16, y + 1, support_z_offset]) {
			cube([8, 1, support_height - 1]);
			translate([0, 0.25, support_height - 1]) cube([8, 0.5, 0.5]);
			translate([0, 0.4, support_height - 0.5]) cube([8, 0.2, 0.5]);
			}
	}

}

if (render_solenoid) {
	// solenoid body
	color(solenoid_body_color) {
		translate([-(platform_side_length + solenoid_body_length) / 2 - solenoid_rod_min, 0, platform_height + solenoid_podium_height + solenoid_body_height / 2])
			cube([solenoid_body_length, solenoid_body_width, solenoid_body_height], center = true);
	}
	
	// solenoid rod
	color(solenoid_rod_color) {
		translate([-(platform_side_length + solenoid_stroke) / 2, 0, platform_height + solenoid_podium_height + solenoid_body_height / 2])
		rotate([0, 90, 0])
			cylinder(r = 1, h = solenoid_stroke, center = true);
	}
}

p_y = 1.5; // path width
p_x = 4; // path length
w_x = 6; // well length
w_y = 8; // well width
n = 8; // number of wells 
m = 8; //separation from midline
	
module base_card()
{translate([-5,-20])square([100,40]);}

module corner(f)
{difference(){square([f,f]);circle(r=f,$fn=50);}}

module path()
{union(){
	translate([w_x/2,-w_y/2])square([p_x,p_y]); // actual path
	translate([w_x/2+1,-w_y/2+p_y+1])rotate(180)corner(1);}}//rounded corners

module path2()
{union(){translate([2*w_x+1,-w_y/2])square([p_x,p_y]); // actual path
			 //translate([2*w_x+2,-p_y/2-1])rotate(90)corner(1);
	      translate([2*w_x+2,-w_y/2+1+p_y])rotate(180)corner(1);//rounded corners	
	      //translate([2*w_x+p_x,-p_y/2-1])corner(1);
	      translate([2*w_x+p_x,-w_y/2+1+p_y])rotate(270)corner(1);}}//rounded corners

module well()
{difference ()
	{	square([w_x,w_y], center=true); 
		translate([w_x/2-2,w_y/2-2])corner(2);
		translate([-(w_x/2-2),w_y/2-2])rotate(90)corner(2);
		//translate([-(w_x/2-2),-(w_y/2-2)])rotate(180)corner(2);
		//translate([w_x/2-2,-(w_y/2-2)])rotate(270)corner(2);
   }}

module color_well() // last well
{translate([n*(w_x+p_x)+1,0])
{difference ()
	{	square([w_y,w_y], center=true); 
		translate([w_y/2-2,w_y/2-2])corner(2);
		translate([-(w_y/2-2),w_y/2-2])rotate(90)corner(2);
		//translate([-(w_y/2-2),-(w_y/2-2)])rotate(180)corner(2);
		//translate([w_y/2-2,-(w_y/2-2)])rotate(270)corner(2);
   }}}

module sample_well() // first well
{union(){translate([0,-w_y/2-1])square([2*w_x+1,w_y+2]); path2();}}

module control_well() // first well
{union(){translate([p_x+w_x,0])well(); path2();}}

module set(){union(){color_well(); 
	{for (i =[2:(n-1)]){translate([i*(p_x+w_x),0]){well();path();}}} }} // 1 set of wells, paths and comb
	
if (render_cartridge) {
	translate([0, -20, 45]) rotate(90, 0, 0) linear_extrude(height = 2, center = true)
	difference(){base_card(); 
						translate([0,-m]){sample_well(); set(); square([12,6],center=true);} 
						translate([0,m]){control_well(); set();}}
}
